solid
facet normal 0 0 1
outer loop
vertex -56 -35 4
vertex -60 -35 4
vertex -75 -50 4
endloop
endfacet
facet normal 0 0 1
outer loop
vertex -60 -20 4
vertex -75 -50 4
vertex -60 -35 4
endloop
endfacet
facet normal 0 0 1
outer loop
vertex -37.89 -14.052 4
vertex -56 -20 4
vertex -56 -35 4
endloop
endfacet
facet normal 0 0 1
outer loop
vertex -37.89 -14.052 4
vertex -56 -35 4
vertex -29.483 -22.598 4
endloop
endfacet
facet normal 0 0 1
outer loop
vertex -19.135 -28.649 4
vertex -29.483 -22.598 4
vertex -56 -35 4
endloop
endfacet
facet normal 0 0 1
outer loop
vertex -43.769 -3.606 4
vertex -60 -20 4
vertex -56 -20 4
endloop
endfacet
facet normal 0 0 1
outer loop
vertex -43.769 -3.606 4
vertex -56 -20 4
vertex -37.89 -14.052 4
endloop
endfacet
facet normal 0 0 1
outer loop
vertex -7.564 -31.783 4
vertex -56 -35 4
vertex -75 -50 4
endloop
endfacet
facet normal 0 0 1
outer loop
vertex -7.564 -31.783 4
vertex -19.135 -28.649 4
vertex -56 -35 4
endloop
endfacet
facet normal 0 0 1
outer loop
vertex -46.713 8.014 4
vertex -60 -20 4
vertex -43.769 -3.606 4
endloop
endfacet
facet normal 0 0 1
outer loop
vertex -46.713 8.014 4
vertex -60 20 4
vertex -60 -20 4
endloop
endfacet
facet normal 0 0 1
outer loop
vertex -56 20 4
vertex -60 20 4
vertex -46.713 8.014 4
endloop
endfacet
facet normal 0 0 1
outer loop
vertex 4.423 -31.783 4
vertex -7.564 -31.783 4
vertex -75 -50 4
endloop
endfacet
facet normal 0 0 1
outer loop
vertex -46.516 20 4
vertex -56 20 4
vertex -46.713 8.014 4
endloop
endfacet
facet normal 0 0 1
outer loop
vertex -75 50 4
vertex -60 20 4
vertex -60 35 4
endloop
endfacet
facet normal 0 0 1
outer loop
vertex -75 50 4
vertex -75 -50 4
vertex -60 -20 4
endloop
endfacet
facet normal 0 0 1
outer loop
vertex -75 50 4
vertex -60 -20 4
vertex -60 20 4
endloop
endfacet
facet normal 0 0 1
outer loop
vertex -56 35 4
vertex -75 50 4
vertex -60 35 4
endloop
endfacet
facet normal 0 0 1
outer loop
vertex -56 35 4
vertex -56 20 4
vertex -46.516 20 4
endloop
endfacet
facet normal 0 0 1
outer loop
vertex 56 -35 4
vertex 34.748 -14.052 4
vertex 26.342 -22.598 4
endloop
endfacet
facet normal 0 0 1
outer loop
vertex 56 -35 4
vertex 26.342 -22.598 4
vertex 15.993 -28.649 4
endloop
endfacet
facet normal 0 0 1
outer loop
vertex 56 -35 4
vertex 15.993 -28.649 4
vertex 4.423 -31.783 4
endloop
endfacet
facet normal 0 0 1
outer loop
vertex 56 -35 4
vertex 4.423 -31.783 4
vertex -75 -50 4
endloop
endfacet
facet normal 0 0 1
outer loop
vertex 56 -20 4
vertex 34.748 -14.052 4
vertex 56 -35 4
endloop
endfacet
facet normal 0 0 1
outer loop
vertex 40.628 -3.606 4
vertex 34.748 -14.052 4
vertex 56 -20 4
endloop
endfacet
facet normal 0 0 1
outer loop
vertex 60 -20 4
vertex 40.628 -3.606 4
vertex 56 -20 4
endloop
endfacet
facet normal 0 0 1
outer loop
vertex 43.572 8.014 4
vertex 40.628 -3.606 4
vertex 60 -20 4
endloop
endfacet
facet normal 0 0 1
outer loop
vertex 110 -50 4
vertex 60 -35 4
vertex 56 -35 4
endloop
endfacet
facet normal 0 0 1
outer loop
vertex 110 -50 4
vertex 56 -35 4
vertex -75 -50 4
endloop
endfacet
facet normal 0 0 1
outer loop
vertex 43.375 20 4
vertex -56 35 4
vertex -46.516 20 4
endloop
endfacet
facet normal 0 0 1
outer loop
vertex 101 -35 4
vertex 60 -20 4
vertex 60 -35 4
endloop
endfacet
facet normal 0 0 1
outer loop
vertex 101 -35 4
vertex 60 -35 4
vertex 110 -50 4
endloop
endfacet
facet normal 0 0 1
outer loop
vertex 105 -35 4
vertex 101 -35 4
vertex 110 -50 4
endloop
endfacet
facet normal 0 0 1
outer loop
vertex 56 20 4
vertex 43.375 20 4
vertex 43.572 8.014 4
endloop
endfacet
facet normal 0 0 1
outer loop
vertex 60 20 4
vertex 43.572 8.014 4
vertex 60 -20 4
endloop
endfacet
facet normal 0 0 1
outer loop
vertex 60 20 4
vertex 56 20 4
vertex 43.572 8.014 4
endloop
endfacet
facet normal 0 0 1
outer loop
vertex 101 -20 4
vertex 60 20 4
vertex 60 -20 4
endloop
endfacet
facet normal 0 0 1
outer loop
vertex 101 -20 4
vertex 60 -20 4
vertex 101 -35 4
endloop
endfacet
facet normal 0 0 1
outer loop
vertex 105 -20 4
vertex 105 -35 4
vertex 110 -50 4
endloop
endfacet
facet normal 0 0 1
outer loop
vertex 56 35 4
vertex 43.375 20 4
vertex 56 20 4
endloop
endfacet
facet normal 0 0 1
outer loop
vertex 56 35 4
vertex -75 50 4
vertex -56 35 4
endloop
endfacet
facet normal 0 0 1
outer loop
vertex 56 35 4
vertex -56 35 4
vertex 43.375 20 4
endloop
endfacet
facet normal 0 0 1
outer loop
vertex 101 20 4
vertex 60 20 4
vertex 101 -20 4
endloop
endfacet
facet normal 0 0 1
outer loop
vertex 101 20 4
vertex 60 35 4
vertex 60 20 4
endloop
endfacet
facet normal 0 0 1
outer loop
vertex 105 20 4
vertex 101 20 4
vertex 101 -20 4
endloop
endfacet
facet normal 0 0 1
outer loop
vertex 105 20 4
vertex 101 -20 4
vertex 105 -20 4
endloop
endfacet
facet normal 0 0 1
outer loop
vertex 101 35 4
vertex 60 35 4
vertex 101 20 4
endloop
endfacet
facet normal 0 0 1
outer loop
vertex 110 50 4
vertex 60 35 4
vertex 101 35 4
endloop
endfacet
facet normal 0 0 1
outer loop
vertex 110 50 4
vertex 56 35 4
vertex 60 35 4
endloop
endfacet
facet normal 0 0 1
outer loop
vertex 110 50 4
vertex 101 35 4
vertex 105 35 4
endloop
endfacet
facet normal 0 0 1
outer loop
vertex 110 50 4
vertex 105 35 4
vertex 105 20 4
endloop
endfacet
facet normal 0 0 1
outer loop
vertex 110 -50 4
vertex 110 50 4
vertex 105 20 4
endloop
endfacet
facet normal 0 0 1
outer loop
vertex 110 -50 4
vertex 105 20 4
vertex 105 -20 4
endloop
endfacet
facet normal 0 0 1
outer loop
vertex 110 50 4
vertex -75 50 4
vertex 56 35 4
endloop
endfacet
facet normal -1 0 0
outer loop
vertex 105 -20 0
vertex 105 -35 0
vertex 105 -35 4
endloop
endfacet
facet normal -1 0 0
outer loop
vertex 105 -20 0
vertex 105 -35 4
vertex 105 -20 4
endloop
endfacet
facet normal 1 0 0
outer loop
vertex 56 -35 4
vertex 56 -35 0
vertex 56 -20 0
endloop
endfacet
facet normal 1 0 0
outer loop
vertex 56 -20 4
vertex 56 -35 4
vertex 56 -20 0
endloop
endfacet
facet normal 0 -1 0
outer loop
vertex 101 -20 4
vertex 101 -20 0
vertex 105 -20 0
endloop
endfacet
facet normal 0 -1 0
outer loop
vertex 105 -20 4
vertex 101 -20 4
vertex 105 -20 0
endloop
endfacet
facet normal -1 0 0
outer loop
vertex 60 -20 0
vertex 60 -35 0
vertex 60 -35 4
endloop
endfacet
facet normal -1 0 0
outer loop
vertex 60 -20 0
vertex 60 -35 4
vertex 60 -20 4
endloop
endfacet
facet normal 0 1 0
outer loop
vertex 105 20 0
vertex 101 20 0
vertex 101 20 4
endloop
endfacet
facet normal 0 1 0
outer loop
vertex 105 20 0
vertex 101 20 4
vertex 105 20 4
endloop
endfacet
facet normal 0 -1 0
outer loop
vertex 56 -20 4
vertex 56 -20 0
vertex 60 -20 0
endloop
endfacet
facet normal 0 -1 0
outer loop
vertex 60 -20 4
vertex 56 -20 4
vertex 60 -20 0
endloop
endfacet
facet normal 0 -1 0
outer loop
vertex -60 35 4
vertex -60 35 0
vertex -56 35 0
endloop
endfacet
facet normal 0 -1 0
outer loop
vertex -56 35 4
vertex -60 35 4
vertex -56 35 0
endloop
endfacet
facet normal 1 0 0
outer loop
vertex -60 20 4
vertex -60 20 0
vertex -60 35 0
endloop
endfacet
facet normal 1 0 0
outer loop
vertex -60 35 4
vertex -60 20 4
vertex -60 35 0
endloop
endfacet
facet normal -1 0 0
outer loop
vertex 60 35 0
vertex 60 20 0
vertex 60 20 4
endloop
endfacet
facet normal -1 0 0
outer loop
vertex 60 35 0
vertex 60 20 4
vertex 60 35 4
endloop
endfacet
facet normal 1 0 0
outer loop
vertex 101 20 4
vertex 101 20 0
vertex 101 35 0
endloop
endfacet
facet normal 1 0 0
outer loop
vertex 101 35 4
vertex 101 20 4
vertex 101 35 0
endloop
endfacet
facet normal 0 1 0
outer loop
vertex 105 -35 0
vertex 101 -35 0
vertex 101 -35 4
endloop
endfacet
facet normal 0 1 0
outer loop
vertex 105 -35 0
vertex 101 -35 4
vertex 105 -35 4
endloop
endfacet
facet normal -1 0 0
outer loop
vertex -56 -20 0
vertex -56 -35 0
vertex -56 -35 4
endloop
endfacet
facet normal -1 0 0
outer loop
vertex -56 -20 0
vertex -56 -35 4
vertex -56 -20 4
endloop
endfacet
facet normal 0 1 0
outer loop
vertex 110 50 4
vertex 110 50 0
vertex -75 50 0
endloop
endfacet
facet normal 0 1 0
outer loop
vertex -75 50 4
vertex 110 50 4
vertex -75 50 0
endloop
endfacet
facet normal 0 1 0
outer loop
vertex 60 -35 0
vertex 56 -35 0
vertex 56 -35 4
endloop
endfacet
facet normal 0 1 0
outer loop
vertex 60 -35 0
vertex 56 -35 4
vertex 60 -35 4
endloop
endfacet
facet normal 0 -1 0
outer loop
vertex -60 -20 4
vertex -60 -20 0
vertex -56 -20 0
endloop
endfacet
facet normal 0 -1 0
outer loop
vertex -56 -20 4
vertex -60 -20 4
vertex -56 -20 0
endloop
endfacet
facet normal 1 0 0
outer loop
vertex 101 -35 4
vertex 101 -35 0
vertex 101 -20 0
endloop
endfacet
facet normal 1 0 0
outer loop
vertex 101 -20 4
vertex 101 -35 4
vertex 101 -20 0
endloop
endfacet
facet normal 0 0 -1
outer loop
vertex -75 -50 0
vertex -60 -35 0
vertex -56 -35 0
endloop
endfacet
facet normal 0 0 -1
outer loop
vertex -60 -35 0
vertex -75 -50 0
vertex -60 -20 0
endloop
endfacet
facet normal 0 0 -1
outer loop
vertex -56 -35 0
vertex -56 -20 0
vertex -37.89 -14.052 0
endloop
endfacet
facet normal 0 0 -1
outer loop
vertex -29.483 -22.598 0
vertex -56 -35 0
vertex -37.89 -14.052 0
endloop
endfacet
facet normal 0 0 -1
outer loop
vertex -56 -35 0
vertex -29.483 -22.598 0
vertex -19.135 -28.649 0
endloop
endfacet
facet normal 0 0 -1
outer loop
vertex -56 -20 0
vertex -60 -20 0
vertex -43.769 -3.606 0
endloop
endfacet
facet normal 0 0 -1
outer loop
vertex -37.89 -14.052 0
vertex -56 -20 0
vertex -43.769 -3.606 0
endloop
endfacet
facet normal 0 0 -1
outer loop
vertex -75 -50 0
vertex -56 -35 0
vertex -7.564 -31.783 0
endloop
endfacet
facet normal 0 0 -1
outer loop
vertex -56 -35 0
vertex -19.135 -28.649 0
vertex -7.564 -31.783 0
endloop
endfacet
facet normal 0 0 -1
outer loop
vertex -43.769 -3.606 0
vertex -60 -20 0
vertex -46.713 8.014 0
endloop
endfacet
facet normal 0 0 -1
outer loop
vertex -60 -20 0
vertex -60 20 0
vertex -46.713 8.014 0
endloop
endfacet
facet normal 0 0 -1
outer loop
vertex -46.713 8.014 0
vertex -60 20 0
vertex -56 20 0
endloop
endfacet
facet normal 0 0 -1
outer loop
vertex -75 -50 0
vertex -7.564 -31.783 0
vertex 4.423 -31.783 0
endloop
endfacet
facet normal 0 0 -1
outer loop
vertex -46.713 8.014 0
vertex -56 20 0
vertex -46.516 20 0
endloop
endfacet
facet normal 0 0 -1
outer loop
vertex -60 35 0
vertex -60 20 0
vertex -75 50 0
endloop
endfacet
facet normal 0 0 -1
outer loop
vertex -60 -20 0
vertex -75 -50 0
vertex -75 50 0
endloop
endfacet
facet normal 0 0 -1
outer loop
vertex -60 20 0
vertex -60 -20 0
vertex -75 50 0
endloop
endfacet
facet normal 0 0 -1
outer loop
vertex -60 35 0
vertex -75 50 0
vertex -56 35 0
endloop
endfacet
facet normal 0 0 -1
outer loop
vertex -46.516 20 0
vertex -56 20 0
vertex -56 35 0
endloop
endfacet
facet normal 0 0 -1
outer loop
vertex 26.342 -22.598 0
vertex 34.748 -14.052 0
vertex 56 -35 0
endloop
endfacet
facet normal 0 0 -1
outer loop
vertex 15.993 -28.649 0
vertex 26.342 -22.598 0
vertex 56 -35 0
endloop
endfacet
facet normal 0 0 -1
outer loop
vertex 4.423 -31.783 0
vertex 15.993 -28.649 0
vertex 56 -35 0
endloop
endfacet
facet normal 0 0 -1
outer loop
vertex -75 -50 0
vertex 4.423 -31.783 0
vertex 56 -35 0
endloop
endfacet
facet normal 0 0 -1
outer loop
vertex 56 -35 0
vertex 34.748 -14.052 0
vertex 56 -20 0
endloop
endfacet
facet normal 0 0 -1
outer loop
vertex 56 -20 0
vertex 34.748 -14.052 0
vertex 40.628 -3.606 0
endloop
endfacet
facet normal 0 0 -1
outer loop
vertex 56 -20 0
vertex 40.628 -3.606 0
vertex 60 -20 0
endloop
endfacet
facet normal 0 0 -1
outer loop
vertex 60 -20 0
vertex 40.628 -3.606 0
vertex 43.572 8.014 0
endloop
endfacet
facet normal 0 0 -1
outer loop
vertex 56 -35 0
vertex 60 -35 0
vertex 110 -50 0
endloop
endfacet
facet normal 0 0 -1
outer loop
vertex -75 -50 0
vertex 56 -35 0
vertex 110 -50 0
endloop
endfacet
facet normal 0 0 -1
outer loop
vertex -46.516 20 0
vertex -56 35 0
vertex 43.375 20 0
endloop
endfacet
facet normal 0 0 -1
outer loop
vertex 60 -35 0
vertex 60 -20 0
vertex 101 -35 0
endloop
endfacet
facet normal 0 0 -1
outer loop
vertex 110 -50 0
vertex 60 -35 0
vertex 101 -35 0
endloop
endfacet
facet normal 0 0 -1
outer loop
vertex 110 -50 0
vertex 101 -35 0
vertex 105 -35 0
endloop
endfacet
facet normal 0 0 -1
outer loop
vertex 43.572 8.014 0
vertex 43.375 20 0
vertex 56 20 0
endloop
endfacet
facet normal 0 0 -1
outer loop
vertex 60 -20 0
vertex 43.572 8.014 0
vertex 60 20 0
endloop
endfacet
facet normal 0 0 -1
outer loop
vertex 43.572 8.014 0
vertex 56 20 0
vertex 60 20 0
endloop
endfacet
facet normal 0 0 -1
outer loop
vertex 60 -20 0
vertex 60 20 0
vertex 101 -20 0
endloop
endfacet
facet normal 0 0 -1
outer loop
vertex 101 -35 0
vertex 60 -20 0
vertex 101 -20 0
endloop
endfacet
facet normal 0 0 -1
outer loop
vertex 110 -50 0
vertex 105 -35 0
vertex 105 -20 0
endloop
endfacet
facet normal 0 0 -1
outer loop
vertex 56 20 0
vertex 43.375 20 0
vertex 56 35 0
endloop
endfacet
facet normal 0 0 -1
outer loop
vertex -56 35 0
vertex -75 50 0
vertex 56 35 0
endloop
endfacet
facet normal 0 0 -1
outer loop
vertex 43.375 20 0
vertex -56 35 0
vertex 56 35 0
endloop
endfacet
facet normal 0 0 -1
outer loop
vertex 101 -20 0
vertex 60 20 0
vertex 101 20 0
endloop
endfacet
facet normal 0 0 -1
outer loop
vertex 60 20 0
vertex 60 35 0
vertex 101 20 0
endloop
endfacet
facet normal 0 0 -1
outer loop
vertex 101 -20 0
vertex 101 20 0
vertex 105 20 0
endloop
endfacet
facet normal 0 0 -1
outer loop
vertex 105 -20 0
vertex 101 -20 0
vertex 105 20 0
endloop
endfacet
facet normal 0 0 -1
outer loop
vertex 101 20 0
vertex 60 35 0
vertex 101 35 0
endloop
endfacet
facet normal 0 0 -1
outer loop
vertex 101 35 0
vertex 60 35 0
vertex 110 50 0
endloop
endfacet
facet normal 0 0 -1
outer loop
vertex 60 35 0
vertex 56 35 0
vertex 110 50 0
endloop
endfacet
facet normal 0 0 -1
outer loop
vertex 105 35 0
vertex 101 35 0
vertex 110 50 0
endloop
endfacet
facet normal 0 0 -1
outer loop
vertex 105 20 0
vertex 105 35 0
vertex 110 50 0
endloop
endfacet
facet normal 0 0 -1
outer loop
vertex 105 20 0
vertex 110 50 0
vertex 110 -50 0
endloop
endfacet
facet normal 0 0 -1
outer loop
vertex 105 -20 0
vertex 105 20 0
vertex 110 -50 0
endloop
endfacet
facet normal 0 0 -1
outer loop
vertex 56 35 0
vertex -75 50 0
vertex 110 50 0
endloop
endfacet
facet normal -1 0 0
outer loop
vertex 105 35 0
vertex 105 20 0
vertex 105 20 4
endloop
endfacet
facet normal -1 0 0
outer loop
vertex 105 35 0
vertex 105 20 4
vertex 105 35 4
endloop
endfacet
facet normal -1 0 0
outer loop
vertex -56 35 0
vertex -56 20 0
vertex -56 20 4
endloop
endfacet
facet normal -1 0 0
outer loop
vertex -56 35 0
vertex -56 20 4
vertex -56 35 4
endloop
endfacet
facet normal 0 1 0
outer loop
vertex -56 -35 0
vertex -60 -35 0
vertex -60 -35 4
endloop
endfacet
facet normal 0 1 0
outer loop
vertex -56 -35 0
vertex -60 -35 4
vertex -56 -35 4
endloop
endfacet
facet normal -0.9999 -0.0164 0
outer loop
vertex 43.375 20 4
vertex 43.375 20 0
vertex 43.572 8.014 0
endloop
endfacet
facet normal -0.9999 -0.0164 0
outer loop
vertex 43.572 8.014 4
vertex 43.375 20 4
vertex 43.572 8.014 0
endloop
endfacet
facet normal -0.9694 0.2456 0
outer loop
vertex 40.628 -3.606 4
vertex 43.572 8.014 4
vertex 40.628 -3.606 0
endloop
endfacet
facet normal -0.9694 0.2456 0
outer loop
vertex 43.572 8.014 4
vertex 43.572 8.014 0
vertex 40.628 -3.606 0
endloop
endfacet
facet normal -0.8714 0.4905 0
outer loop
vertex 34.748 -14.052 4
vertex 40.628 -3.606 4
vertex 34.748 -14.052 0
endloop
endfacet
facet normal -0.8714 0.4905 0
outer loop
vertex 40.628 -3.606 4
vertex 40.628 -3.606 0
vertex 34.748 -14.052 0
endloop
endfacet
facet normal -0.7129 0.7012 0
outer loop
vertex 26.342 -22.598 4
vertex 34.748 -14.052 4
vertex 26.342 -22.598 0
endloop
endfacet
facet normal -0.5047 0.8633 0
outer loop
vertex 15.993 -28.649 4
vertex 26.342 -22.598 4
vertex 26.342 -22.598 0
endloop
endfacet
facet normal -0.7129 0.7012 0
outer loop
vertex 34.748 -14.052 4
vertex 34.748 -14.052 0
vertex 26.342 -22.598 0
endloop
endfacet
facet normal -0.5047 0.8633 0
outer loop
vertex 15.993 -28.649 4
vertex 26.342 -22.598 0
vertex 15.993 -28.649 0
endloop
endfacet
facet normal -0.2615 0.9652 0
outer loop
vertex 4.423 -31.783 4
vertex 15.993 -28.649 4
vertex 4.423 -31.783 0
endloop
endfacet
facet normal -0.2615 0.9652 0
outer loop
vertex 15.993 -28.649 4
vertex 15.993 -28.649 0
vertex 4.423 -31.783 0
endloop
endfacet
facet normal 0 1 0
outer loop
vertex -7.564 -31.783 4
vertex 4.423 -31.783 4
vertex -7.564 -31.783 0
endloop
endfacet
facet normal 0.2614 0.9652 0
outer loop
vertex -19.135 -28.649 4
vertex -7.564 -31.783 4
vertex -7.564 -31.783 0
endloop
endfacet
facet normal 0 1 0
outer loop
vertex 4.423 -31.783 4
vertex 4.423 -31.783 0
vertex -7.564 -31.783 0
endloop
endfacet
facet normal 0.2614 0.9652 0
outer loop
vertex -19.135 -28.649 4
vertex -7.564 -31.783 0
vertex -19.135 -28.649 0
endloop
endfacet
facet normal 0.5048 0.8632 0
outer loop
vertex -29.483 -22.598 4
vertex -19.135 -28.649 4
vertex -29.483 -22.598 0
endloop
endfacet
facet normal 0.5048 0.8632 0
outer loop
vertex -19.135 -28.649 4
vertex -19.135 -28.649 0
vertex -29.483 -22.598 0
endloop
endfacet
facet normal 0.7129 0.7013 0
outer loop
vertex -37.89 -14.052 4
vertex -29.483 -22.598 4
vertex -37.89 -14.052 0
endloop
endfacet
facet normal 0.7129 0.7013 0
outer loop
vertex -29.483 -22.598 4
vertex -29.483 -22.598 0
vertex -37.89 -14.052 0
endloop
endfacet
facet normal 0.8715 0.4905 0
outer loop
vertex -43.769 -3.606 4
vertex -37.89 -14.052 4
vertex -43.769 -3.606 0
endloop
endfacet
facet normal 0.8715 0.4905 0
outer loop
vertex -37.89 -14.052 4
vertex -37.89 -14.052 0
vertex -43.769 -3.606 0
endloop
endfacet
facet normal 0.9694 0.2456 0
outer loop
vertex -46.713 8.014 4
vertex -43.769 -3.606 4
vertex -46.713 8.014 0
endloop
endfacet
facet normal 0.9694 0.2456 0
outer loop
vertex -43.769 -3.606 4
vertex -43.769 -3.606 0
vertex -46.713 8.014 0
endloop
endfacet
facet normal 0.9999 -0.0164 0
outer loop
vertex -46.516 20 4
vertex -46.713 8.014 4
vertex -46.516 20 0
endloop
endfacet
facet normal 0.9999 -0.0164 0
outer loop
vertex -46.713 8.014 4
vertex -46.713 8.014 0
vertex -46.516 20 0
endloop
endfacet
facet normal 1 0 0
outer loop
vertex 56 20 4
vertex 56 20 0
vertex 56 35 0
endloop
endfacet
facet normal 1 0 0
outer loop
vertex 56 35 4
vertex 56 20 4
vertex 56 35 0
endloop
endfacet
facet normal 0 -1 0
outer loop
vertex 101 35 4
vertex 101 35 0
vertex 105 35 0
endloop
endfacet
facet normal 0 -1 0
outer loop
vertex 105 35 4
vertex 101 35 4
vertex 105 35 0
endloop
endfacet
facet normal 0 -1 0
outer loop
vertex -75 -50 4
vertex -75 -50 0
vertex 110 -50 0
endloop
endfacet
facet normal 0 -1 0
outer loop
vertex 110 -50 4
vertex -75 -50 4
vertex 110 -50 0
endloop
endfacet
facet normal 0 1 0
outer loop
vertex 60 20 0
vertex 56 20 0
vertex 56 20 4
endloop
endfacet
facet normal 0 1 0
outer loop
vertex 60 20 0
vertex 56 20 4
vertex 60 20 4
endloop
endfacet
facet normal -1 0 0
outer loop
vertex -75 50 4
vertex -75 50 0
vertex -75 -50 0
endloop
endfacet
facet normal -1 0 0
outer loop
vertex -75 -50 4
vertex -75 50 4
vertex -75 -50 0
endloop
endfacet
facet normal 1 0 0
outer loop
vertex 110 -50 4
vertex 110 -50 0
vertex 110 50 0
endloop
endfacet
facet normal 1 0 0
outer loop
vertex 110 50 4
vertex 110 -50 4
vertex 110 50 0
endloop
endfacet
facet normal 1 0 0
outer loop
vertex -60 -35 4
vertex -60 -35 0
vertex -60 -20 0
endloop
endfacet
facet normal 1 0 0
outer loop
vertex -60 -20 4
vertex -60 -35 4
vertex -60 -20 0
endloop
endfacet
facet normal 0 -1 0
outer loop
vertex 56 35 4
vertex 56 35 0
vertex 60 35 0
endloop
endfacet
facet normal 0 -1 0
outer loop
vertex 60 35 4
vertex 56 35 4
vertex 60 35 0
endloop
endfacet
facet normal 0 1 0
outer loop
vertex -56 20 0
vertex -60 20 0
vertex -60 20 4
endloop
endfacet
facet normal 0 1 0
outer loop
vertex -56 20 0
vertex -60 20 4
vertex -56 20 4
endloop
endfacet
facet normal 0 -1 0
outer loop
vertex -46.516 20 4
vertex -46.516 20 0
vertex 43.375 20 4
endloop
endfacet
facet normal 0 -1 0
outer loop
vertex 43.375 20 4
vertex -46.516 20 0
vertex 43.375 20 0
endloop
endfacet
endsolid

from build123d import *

# Parameters (mm, degrees)
SKETCH1_W           = 4
SKETCH1_H           = 15
BOSS_EXTRUDE1_DEPTH = 4


with BuildPart() as part:
    # Sketch1 → Boss-Extrude1 (new body)
    with BuildSketch(Plane.XY):
        Polygon((-75, -50), (75, -50), (110, -50), (110, 50), (75, 50), (-75, 50), align=None)
        with BuildLine():
            Line((-46.516283173, 20), (43.374974686, 20))
            ThreePointArc((43.374974686, 20), (-1.570654243, -32.179711562), (-46.516283173, 20))
        make_face(mode=Mode.SUBTRACT)
        with Locations((58, 27.5)):
            Rectangle(SKETCH1_W, SKETCH1_H, mode=Mode.SUBTRACT)
        with Locations((58, -27.5)):
            Rectangle(SKETCH1_W, SKETCH1_H, mode=Mode.SUBTRACT)
        with Locations((-58, -27.5)):
            Rectangle(SKETCH1_W, SKETCH1_H, mode=Mode.SUBTRACT)
        with Locations((-58, 27.5)):
            Rectangle(SKETCH1_W, SKETCH1_H, mode=Mode.SUBTRACT)
        with Locations((103, 27.5)):
            Rectangle(SKETCH1_W, SKETCH1_H, mode=Mode.SUBTRACT)
        with Locations((103, -27.5)):
            Rectangle(SKETCH1_W, SKETCH1_H, mode=Mode.SUBTRACT)
    extrude(amount=BOSS_EXTRUDE1_DEPTH)


solid = part.part
